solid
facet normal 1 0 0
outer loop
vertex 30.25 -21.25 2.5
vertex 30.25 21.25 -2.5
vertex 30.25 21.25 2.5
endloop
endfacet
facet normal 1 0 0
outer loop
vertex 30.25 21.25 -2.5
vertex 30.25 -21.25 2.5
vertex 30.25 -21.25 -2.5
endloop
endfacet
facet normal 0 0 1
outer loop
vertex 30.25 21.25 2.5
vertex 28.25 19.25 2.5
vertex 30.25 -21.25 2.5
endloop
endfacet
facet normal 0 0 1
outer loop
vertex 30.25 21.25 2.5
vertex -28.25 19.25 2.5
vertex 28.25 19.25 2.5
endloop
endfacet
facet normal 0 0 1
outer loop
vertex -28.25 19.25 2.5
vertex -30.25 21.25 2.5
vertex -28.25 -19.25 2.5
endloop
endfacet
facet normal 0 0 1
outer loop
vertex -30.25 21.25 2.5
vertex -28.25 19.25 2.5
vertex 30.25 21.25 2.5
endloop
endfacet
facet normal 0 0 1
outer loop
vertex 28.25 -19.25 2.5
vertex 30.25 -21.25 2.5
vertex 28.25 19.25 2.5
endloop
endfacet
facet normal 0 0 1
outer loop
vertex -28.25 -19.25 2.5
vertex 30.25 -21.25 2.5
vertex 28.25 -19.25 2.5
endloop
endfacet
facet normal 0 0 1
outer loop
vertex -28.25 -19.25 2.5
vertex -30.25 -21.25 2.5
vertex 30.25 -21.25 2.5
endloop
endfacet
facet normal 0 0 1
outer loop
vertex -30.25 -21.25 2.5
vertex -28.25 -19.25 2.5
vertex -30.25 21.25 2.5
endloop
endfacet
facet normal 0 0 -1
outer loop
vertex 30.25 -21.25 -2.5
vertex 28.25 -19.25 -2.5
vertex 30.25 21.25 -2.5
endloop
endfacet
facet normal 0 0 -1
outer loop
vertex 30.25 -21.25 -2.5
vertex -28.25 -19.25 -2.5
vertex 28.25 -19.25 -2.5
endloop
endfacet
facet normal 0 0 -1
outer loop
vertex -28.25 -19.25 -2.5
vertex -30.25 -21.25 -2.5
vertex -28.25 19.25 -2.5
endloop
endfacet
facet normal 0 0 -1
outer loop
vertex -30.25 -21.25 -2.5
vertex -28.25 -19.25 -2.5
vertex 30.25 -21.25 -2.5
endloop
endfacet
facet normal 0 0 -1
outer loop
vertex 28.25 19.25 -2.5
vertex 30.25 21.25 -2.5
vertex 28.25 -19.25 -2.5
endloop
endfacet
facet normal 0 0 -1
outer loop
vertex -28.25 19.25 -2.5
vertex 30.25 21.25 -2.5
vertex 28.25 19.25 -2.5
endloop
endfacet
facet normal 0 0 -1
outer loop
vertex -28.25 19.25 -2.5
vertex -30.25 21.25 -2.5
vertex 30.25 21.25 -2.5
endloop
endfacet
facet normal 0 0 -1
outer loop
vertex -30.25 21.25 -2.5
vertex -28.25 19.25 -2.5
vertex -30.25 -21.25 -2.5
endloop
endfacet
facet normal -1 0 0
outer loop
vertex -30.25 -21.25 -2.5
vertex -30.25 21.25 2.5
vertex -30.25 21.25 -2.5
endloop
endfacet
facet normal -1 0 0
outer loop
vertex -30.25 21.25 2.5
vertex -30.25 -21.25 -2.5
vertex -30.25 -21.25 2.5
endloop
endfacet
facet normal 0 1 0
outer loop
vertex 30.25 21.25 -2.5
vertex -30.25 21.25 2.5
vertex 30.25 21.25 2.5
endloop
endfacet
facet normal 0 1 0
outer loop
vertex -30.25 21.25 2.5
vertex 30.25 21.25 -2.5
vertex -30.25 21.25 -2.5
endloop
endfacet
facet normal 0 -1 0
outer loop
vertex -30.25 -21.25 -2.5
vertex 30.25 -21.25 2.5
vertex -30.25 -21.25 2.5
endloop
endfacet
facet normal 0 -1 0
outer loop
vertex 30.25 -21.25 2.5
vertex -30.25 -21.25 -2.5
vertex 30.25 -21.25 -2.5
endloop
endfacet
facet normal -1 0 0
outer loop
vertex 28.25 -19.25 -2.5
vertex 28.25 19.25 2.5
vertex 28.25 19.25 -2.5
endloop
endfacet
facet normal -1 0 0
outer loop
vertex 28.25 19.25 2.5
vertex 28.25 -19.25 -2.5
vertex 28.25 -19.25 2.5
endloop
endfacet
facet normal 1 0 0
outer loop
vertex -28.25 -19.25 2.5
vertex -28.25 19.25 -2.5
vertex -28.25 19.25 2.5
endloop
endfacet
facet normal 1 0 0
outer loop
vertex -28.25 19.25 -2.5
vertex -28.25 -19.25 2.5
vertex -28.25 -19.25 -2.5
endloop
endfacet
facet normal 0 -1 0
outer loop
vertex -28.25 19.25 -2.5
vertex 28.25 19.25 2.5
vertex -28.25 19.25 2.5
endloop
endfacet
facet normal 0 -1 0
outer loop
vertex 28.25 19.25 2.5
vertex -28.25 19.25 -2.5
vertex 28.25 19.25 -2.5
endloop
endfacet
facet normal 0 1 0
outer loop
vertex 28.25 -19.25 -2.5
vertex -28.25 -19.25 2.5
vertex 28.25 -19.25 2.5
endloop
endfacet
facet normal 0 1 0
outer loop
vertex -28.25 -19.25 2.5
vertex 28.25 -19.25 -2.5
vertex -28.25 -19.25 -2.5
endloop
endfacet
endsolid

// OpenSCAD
THICKNESS = 2;
WIDTH = 56.5;
LENGTH = 38.5;
HEIGHT = 5;

module adapter() {
  wt = 2 * THICKNESS;
  difference() {
    cube(size = [WIDTH + wt, LENGTH + wt, HEIGHT], center = true);
    cube(size = [WIDTH, LENGTH, HEIGHT], center = true);
  }
}

adapter();
